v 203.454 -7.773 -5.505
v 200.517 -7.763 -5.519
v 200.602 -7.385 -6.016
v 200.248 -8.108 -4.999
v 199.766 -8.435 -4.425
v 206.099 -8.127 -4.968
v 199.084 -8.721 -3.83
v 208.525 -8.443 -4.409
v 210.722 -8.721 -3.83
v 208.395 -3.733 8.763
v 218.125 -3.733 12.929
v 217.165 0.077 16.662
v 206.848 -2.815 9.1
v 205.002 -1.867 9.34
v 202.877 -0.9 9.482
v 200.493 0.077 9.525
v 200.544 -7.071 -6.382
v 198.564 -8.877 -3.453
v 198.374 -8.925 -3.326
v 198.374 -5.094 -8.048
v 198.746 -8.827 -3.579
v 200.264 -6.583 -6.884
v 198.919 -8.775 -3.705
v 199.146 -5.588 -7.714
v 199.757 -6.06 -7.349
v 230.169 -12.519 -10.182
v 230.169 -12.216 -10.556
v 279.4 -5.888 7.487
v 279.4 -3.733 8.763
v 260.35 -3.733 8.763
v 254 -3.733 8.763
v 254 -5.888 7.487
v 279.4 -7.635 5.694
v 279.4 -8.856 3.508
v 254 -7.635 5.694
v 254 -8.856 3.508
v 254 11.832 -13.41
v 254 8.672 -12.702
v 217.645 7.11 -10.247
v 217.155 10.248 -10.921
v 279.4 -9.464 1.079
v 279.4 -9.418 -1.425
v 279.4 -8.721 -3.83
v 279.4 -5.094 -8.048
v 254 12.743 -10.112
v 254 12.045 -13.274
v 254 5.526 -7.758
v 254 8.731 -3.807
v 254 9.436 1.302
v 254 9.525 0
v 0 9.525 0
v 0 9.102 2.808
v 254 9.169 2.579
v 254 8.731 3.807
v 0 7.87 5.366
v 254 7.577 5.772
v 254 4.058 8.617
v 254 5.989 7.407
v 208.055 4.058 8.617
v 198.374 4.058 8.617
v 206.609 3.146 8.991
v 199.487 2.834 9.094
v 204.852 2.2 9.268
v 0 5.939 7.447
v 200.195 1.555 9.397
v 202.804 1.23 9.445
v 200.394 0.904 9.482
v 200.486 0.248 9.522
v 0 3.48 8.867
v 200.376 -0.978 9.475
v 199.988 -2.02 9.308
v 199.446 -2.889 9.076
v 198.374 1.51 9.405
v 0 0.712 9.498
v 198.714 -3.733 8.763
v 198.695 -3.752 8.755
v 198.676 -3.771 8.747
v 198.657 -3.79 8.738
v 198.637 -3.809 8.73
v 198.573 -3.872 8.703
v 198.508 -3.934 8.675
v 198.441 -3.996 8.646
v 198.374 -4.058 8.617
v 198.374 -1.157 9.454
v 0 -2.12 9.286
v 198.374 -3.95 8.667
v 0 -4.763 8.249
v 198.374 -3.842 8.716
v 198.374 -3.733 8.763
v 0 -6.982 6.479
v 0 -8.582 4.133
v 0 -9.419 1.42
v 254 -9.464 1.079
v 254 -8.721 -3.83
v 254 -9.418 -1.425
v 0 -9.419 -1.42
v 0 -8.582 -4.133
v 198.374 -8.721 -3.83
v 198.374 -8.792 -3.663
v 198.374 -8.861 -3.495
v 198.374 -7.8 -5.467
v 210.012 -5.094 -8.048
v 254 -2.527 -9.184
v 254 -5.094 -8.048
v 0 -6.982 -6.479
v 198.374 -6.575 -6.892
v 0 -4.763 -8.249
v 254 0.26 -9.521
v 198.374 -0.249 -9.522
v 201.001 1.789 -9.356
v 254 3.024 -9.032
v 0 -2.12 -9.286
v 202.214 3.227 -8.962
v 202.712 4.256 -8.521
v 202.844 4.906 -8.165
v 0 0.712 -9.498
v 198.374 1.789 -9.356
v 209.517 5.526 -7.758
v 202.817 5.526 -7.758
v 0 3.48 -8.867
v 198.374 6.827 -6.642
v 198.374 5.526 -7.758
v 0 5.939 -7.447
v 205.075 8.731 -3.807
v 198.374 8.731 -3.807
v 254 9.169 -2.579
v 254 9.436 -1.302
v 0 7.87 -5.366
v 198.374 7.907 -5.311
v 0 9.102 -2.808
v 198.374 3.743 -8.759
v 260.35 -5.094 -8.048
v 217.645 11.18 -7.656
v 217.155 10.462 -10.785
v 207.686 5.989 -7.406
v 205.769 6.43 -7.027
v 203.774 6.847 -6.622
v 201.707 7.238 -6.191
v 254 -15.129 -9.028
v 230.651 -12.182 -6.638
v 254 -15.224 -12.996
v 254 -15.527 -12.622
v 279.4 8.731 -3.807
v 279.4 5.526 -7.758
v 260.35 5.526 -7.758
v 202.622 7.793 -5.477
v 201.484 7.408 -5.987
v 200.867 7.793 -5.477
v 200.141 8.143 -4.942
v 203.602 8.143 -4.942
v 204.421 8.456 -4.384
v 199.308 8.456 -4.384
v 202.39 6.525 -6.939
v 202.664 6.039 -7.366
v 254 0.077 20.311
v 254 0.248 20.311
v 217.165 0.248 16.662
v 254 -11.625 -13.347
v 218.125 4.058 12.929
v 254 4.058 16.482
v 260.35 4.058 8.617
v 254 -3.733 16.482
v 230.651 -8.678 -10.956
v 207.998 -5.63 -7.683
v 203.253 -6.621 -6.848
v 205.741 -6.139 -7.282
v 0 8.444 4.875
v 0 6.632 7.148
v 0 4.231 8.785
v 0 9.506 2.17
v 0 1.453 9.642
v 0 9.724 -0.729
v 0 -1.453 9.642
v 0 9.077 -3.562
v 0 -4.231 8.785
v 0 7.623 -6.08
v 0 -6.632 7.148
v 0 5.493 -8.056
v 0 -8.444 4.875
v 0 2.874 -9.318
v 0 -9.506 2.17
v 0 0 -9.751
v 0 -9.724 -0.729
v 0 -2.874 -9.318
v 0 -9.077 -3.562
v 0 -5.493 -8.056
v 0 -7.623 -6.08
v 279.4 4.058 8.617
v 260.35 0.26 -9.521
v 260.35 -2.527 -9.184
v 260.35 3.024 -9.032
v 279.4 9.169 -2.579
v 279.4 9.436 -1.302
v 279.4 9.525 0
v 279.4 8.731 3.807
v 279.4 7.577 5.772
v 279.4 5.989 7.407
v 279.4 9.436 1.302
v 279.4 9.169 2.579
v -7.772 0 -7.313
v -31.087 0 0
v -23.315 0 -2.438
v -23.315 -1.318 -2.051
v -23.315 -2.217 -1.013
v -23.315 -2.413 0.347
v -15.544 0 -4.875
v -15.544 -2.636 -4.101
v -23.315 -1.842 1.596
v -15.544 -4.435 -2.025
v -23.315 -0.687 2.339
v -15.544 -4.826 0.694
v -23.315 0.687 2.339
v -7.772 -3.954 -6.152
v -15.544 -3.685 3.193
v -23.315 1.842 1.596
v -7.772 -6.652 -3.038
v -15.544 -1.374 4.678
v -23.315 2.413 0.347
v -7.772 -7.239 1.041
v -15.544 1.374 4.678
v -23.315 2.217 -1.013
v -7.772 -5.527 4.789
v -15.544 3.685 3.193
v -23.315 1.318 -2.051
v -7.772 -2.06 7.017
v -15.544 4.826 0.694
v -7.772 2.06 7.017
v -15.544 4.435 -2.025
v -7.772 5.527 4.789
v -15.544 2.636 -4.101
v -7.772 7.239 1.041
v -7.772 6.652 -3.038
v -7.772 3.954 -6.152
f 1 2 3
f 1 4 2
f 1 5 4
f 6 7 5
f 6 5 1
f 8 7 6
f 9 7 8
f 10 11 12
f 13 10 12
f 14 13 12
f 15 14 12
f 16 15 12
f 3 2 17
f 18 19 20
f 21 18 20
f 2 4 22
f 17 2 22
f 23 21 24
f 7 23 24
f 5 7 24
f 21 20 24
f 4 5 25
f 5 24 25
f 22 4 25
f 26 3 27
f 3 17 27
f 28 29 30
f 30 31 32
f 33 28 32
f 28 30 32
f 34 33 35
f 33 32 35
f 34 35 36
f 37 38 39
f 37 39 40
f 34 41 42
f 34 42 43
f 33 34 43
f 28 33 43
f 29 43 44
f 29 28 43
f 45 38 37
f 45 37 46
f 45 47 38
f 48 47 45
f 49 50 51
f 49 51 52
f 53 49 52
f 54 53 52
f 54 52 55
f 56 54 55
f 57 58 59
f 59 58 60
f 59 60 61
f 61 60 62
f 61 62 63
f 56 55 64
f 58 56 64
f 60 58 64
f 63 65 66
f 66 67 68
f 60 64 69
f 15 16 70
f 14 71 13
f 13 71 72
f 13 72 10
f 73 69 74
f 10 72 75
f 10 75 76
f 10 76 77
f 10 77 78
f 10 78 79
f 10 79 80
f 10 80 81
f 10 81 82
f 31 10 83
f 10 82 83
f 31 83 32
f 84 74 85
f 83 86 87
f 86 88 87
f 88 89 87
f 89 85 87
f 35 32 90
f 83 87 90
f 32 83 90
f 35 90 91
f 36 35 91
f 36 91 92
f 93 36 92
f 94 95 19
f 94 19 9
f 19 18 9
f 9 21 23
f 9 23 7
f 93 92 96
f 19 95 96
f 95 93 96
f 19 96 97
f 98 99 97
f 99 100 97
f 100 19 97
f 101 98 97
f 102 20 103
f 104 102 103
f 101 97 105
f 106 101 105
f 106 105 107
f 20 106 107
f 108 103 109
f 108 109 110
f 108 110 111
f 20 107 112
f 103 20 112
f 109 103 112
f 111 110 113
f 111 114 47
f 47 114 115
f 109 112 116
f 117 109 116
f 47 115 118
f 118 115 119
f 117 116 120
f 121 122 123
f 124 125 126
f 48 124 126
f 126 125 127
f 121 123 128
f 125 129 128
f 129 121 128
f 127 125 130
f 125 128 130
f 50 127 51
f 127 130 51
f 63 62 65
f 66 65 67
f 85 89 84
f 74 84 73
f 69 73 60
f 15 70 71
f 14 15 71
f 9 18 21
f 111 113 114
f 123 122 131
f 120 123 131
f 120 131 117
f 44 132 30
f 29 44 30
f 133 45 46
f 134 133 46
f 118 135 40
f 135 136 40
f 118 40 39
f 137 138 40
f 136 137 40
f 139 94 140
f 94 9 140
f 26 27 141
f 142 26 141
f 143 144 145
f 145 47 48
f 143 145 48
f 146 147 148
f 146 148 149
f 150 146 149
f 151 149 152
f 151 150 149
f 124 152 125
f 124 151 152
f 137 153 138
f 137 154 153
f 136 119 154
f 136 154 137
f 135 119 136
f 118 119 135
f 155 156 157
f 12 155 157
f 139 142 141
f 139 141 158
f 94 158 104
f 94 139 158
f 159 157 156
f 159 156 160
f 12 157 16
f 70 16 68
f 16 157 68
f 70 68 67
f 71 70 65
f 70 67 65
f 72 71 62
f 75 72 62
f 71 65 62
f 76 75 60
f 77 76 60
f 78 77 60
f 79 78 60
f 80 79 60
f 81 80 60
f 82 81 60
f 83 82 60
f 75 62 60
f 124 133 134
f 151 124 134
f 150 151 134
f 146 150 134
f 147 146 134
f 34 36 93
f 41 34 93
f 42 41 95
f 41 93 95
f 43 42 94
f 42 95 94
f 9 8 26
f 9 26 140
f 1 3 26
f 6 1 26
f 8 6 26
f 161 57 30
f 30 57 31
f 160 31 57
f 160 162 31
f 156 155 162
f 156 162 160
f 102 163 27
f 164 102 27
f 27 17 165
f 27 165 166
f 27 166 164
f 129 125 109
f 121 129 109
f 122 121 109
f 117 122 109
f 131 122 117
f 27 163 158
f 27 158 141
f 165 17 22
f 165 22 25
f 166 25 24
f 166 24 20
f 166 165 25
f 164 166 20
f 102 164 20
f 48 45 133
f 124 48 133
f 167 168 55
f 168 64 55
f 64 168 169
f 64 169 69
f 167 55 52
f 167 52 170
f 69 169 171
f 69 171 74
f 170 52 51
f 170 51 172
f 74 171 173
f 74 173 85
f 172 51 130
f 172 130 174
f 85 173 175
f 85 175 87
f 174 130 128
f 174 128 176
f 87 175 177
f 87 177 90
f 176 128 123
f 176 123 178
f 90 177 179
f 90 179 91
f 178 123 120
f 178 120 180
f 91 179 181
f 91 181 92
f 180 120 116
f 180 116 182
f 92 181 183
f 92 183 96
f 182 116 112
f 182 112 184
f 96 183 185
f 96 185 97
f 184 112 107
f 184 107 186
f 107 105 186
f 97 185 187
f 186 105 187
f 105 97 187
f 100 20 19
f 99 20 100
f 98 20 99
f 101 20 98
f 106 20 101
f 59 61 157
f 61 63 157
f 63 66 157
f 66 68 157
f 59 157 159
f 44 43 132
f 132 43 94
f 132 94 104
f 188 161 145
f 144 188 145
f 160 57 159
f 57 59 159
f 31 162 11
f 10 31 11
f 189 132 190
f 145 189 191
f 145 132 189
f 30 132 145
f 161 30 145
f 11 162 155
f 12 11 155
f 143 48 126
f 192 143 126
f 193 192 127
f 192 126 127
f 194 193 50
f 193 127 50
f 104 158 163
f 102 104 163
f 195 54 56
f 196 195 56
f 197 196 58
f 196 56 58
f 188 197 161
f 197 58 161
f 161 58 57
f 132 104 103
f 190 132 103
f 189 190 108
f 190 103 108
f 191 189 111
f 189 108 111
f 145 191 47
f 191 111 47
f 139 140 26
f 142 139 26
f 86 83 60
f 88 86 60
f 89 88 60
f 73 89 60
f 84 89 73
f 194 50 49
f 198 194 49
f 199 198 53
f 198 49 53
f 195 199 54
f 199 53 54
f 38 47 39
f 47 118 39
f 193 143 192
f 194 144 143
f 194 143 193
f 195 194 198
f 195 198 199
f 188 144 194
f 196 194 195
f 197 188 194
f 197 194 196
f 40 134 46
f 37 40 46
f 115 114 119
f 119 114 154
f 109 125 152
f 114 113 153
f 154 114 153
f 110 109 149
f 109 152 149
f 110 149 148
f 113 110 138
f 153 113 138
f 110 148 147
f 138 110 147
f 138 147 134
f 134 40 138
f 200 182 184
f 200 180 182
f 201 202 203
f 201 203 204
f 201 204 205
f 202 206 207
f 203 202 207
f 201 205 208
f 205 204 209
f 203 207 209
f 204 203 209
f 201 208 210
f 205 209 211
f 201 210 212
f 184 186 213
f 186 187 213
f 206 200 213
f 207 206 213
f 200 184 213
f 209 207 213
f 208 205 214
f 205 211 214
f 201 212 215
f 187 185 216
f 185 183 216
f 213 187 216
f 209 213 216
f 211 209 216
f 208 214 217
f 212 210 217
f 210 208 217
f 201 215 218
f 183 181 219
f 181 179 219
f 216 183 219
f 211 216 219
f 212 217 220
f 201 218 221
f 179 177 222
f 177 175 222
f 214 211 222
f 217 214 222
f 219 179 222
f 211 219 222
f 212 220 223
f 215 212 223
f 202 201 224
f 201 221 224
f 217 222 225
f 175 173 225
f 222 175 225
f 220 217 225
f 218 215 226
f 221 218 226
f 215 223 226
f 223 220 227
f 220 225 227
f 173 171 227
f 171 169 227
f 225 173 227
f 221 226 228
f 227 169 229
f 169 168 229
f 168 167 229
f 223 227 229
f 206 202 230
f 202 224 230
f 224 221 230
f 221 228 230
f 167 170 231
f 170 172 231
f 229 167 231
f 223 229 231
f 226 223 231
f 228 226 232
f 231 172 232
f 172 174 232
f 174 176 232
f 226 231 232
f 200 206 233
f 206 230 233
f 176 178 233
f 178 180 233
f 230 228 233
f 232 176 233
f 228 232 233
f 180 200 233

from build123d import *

# Parameters (mm, degrees)
F0_R          = 9.525
F1_DEPTH      = 254
F5_DEPTH      = 55.626
F7_DEPTH      = 6.35
F8_DEPTH      = 25.4
F10_DEPTH     = 25.4
F12_DEPTH     = 25.4
F14_DEPTH     = 25.4
F15_T1_DEPTH  = 44.8533405939
F15_T3_DEPTH  = 44.8533405939
F15_T8_DEPTH  = 28.2795963183
F15_S9_R      = 9.525
F15_T10_DEPTH = 17
F15_T14_DEPTH = 27.9095113127
F15_S15_R     = 9.525
F15_T16_DEPTH = 17
F16_T1_DEPTH  = 52.8359208118
F16_T3_DEPTH  = 52.8359208118
F16_T8_DEPTH  = 31.126263523
F16_S9_R      = 9.525
F16_T10_DEPTH = 18
F16_T14_DEPTH = 35.8525293061
F16_S15_R     = 9.525
F16_T16_DEPTH = 20
F17_T1_DEPTH  = 37.2074314298
F17_T3_DEPTH  = 37.2074314298
F17_T8_DEPTH  = 45.6448991689
F17_S9_R      = 9.525
F17_T10_DEPTH = 25
F17_T14_DEPTH = 44.9174010309
F17_S15_R     = 9.525
F17_T16_DEPTH = 25


# Not quite as in the source:
# - a fillet or chamfer that OpenCascade refuses, or shapes differently, is made with other operations: its cross-section is extruded or revolved along the edge and cut away or added
# - a feature names something its author has since deleted; it is built from what else it names


with BuildPart() as f1:
    # F0 (on Right) → F1 (new body)
    with BuildSketch(Plane.YZ):
        Circle(F0_R)
    extrude(amount=F1_DEPTH)

    # F2 (on Front) → F3 (revolve)
    with BuildSketch(Plane.XZ):
        Polygon((0, -9.7508067265), (0, 0), (-31.0870110989, 0), align=None)
    revolve(axis=Axis((-15.5435055494, 0, 0), (-1, 0, 0)))

    # F4 (on face) → F5 (join)
    with BuildSketch(Plane.YZ.offset(254)):
        with BuildLine():
            ThreePointArc((-3.7328505423, 8.7630731955), (0.1780475173, 9.5233357644), (4.0577948396, 8.6174199178))
            Line((4.0577948396, 8.6174199178), (4.0577948396, 20.311106017))
            Line((4.0577948396, 20.311106017), (-3.7328505423, 20.311106017))
            Line((-3.7328505423, 20.311106017), (-3.7328505423, 8.7630731955))
        make_face()
        with BuildLine():
            ThreePointArc((-5.0939482873, -8.0484356149), (-7.2224802699, -6.2097829069), (-8.7212105654, -3.8296359191))
            Line((-8.7212105654, -3.8296359191), (-17.1272028238, -10.6496075168))
            Line((-17.1272028238, -10.6496075168), (-13.6232364185, -14.9684399422))
            Line((-13.6232364185, -14.9684399422), (-5.0939482873, -8.0484356149))
        make_face()
        with BuildLine():
            Line((13.9740978255, -12.0467544007), (8.7309135752, -3.8074628223))
            ThreePointArc((8.7309135752, -3.8074628223), (7.3970545146, -6.0007674099), (5.5259177996, -7.75821226))
            Line((5.5259177996, -7.75821226), (9.9034377135, -14.6371738298))
            Line((9.9034377135, -14.6371738298), (13.9740978255, -12.0467544007))
        make_face()
    extrude(amount=-F5_DEPTH)

    # F6 (on face) → F7 (join)
    with BuildSketch(Plane.YZ.offset(254)):
        Polygon((4.0577948396, 8.6174199178), (-3.7328505423, 8.7630731955), (-5.0939482873, -8.0484356149), (5.5259177996, -7.75821226), align=None)
        with BuildLine():
            Line((5.5259177996, -7.75821226), (-5.0939482873, -8.0484356149))
            ThreePointArc((-5.0939482873, -8.0484356149), (0.2602053301, -9.5214451732), (5.5259177996, -7.75821226))
        make_face()
    extrude(amount=F7_DEPTH)

    # F6 (on face) → F8 (join)
    with BuildSketch(Plane.YZ.offset(254)):
        Polygon((-5.0939482873, -8.0484356149), (-3.7328505423, 8.7630731955), (-8.8555062097, 3.5079388207), (-8.7212105654, -3.8296359191), align=None)
        Polygon((8.7309135752, 3.8074628223), (4.0577948396, 8.6174199178), (5.5259177996, -7.75821226), (8.7309135752, -3.8074628223), align=None)
        with BuildLine():
            ThreePointArc((9.525, 0), (9.3243653083, 1.9446944743), (8.7309135752, 3.8074628223))
            Line((8.7309135752, 3.8074628223), (8.7309135752, -3.8074628223))
            ThreePointArc((8.7309135752, -3.8074628223), (9.3243653083, -1.9446944743), (9.525, 0))
        make_face()
        with BuildLine():
            ThreePointArc((8.7309135752, 3.8074628223), (6.8316679914, 6.6373140242), (4.0577948396, 8.6174199178))
            Line((4.0577948396, 8.6174199178), (8.7309135752, 3.8074628223))
        make_face()
        with BuildLine():
            Line((-8.7212105654, -3.8296359191), (-8.8555062097, 3.5079388207))
            ThreePointArc((-8.8555062097, 3.5079388207), (-9.5234050588, -0.1743017091), (-8.7212105654, -3.8296359191))
        make_face()
        with BuildLine():
            Line((-8.8555062097, 3.5079388207), (-3.7328505423, 8.7630731955))
            ThreePointArc((-3.7328505423, 8.7630731955), (-6.8206151301, 6.6486716152), (-8.8555062097, 3.5079388207))
        make_face()
    extrude(amount=F8_DEPTH)

    # F9 (on face) → F10 (cut)
    with BuildSketch(Plane(origin=(0, 4.0577948396, 0), x_dir=(-1, 0, 0), z_dir=(0, 1, 0))):
        Polygon((-217.1654254198, 16.6623666883), (-198.374, 8.6174199178), (-198.374, 20.311106017), (-254, 20.311106017), align=None)
    extrude(amount=-F10_DEPTH, mode=Mode.SUBTRACT)

    # F11 (on face) → F12 (cut)
    with BuildSketch(Plane(origin=(0, 4.4898005119, 2.8571450721), x_dir=(-1, 0, 0), z_dir=(0, 0.843661548, 0.5368753975))):
        Polygon((-198.374, -7.8996226746), (-217.1549183124, -14.7158552648), (-254, -17.6657327906), (-198.374, -17.6657327906), align=None)
    extrude(amount=-F12_DEPTH, mode=Mode.SUBTRACT)

    # F13 (on face) → F14 (cut)
    with BuildSketch(Plane(origin=(0, 1.9157700793, -2.3612925984), x_dir=(1, 0, 0), z_dir=(0, 0.6300417268, -0.7765612806))):
        Polygon((230.1693707705, 16.137143597), (254, 20.0100196673), (198.374, 20.0100196673), (198.374, 9.0266132778), align=None)
    extrude(amount=-F14_DEPTH, mode=Mode.SUBTRACT)

    # F15: chamfer of 3.81 on 4 edges, made by hand

    # F15_s2 → F15_t1 (cut)
    with BuildSketch(Plane(origin=(257.4244465349, 0, 25.499811331), x_dir=(0, 1, 0), z_dir=(-0.9951296233, 0, -0.098575011))):
        with BuildLine():
            Line((0.1400317661, 4.7181064364), (4.165557913, 8.7436325833))
            Line((4.165557913, 8.7436325833), (4.241757913, 8.7436325833))
            ThreePointArc((4.241757913, 8.7436325833), (4.1339948396, 6.7847510466), (4.1339948396, 4.8258695099))
            Line((4.1339948396, 4.8258695099), (4.0577948396, 4.7496695099))
            ThreePointArc((4.0577948396, 4.7496695099), (2.0989133028, 4.7496695099), (0.1400317661, 4.6419064364))
            Line((0.1400317661, 4.6419064364), (0.1400317661, 4.7181064364))
        make_face()
    extrude(amount=F15_T1_DEPTH, mode=Mode.SUBTRACT)

    # F15_s4 → F15_t3 (cut)
    with BuildSketch(Plane(origin=(212.789558605, 0, 21.0783927893), x_dir=(0, 1, 0), z_dir=(0.9951296233, 0, 0.098575011))):
        with BuildLine():
            Line((-3.8406136157, -8.7436325833), (0.1849125312, -4.7181064364))
            Line((0.1849125312, -4.7181064364), (0.1849125312, -4.6419064364))
            ThreePointArc((0.1849125312, -4.6419064364), (-1.7739690056, -4.7496695099), (-3.7328505423, -4.7496695099))
            Line((-3.7328505423, -4.7496695099), (-3.8090505423, -4.8258695099))
            ThreePointArc((-3.8090505423, -4.8258695099), (-3.8090505423, -6.7847510466), (-3.9168136157, -8.7436325833))
            Line((-3.9168136157, -8.7436325833), (-3.8406136157, -8.7436325833))
        make_face()
    extrude(amount=F15_T3_DEPTH, mode=Mode.SUBTRACT)


with BuildPart() as f15_tool6:
    # F15_s7 → F15_t8 (new body)
    with BuildSketch(Plane(origin=(193.1590423404, 0, 82.6948557196), x_dir=(0, 1, 0), z_dir=(-0.9192958979, 0, -0.3935670871))):
        with BuildLine():
            Line((0.1400317661, 70.0437554835), (4.165557913, 74.0692816304))
            Line((4.165557913, 74.0692816304), (4.241757913, 74.0692816304))
            ThreePointArc((4.241757913, 74.0692816304), (4.1339948396, 72.1104000937), (4.1339948396, 70.1515185569))
            Line((4.1339948396, 70.1515185569), (4.0577948396, 70.0753185569))
            ThreePointArc((4.0577948396, 70.0753185569), (2.0989133028, 70.0753185569), (0.1400317661, 69.9675554835))
            Line((0.1400317661, 69.9675554835), (0.1400317661, 70.0437554835))
        make_face()
    extrude(amount=F15_T8_DEPTH)

    # F15_s9 → F15_t10 (cut, symmetric)
    with BuildSketch(Plane.YZ.offset(208.5)):
        Circle(F15_S9_R)
    extrude(amount=F15_T10_DEPTH, both=True, mode=Mode.SUBTRACT)


with BuildPart() as f1_1:
    add(f1.part)

    # F15_t5: cut F15_tool6
    add(f15_tool6.part, mode=Mode.SUBTRACT)


with BuildPart() as f15_tool12:
    # F15_s13 → F15_t14 (new body)
    with BuildSketch(Plane(origin=(167.5019430775, 0, 71.7105906496), x_dir=(0, 1, 0), z_dir=(0.9192958979, 0, 0.3935670871))):
        with BuildLine():
            Line((-3.8406136157, -74.0692816304), (0.1849125312, -70.0437554835))
            Line((0.1849125312, -70.0437554835), (0.1849125312, -69.9675554835))
            ThreePointArc((0.1849125312, -69.9675554835), (-1.7739690056, -70.0753185569), (-3.7328505423, -70.0753185569))
            Line((-3.7328505423, -70.0753185569), (-3.8090505423, -70.1515185569))
            ThreePointArc((-3.8090505423, -70.1515185569), (-3.8090505423, -72.1104000937), (-3.9168136157, -74.0692816304))
            Line((-3.9168136157, -74.0692816304), (-3.8406136157, -74.0692816304))
        make_face()
    extrude(amount=F15_T14_DEPTH)

    # F15_s15 → F15_t16 (cut, symmetric)
    with BuildSketch(Plane.YZ.offset(208.7)):
        Circle(F15_S15_R)
    extrude(amount=F15_T16_DEPTH, both=True, mode=Mode.SUBTRACT)


with BuildPart() as f1_2:
    add(f1_1.part)

    # F15_t11: cut F15_tool12
    add(f15_tool12.part, mode=Mode.SUBTRACT)

    # F16: chamfer of 2.286 on 4 edges, made by hand

    # F16_s2 → F16_t1 (cut)
    with BuildSketch(Plane(origin=(259.6477190804, 11.1604697827, -17.5378854343), x_dir=(0.042943471, -0.9990775037, 0), z_dir=(-0.9968103928, -0.0428460235, 0.0673294822))):
        Polygon((2.2434282818, 4.4374187115), (-0.9134913616, 3.7406760293), (1.0133398012, 2.5105875487), align=None)
    extrude(amount=F16_T1_DEPTH, mode=Mode.SUBTRACT)

    # F16_s4 → F16_t3 (cut)
    with BuildSketch(Plane(origin=(206.9803241045, 8.8966606792, -13.980470247), x_dir=(-0.042943471, 0.9990775037, 0), z_dir=(0.9968103928, 0.0428460235, -0.0673294822))):
        Polygon((1.823476661, 7.0337297004), (1.1267339788, 3.8768100571), (3.0535651416, 5.1068985377), align=None)
    extrude(amount=F16_T3_DEPTH, mode=Mode.SUBTRACT)


with BuildPart() as f16_tool6:
    # F16_s7 → F16_t8 (new body)
    with BuildSketch(Plane(origin=(205.9939924457, 40.1379913763, -63.0740020828), x_dir=(0.1912534961, -0.9815406768, 0), z_dir=(-0.9400053053, -0.1831603164, 0.2878234257))):
        Polygon((31.47248323, 51.4536328512), (34.6470195867, 52.0651154105), (33.365492688, 50.1721059525), align=None)
    extrude(amount=F16_T8_DEPTH)

    # F16_s9 → F16_t10 (cut, symmetric)
    with BuildSketch(Plane.YZ.offset(212.3)):
        Circle(F16_S9_R)
    extrude(amount=F16_T10_DEPTH, both=True, mode=Mode.SUBTRACT)


with BuildPart() as f1_3:
    add(f1_2.part)

    # F16_t5: cut F16_tool6
    add(f16_tool6.part, mode=Mode.SUBTRACT)


with BuildPart() as f16_tool12:
    # F16_s13 → F16_t14 (new body)
    with BuildSketch(Plane(origin=(172.2924246879, 33.5712307637, -52.7548042766), x_dir=(-0.1912534961, 0.9815406768, 0), z_dir=(0.9400053053, 0.1831603164, -0.2878234257))):
        Polygon((-30.6515011053, 54.7699959311), (-31.2629836646, 51.5954595744), (-29.3699742066, 52.8769864731), align=None)
    extrude(amount=F16_T14_DEPTH)

    # F16_s15 → F16_t16 (cut, symmetric)
    with BuildSketch(Plane.YZ.offset(210.1)):
        Circle(F16_S15_R)
    extrude(amount=F16_T16_DEPTH, both=True, mode=Mode.SUBTRACT)


with BuildPart() as f1_4:
    add(f1_3.part)

    # F16_t11: cut F16_tool12
    add(f16_tool12.part, mode=Mode.SUBTRACT)

    # F17: chamfer of 2.54 on 4 edges, made by hand

    # F17_s2 → F17_t1 (cut)
    with BuildSketch(Plane(origin=(220.3542251508, -27.8096296574, -22.5625813797), x_dir=(0.1252109944, 0.9921301361, 0), z_dir=(0.9870501192, -0.1245698749, -0.1010663563))):
        Polygon((20.2701864549, 12.3371401962), (16.6998573856, 12.7320456743), (18.2875691812, 10.7494284006), align=None)
    extrude(amount=F17_T1_DEPTH, mode=Mode.SUBTRACT)

    # F17_s4 → F17_t3 (cut)
    with BuildSketch(Plane(origin=(257.0798247798, -32.4445547373, -26.3230009032), x_dir=(-0.1252109944, -0.9921301361, 0), z_dir=(-0.9870501192, 0.1245698749, 0.1010663563))):
        Polygon((-16.7937957885, 16.6782002076), (-16.3988903104, 13.1078711382), (-14.8111785147, 15.090488412), align=None)
    extrude(amount=F17_T3_DEPTH, mode=Mode.SUBTRACT)


with BuildPart() as f17_tool6:
    # F17_s7 → F17_t8 (new body)
    with BuildSketch(Plane(origin=(184.4733137003, -32.036670961, -25.9920755723), x_dir=(0.1711045444, 0.9852528787, 0), z_dir=(0.9758943907, -0.1694792968, -0.1375023858))):
        Polygon((30.9152465813, 20.5992083681), (27.3471595892, 21.0138832013), (28.9238656686, 19.0225022887), align=None)
    extrude(amount=F17_T8_DEPTH)

    # F17_s9 → F17_t10 (cut, symmetric)
    with BuildSketch(Plane.YZ.offset(214.5)):
        Circle(F17_S9_R)
    extrude(amount=F17_T10_DEPTH, both=True, mode=Mode.SUBTRACT)


with BuildPart() as f1_5:
    add(f1_4.part)

    # F17_t5: cut F17_tool6
    add(f17_tool6.part, mode=Mode.SUBTRACT)


with BuildPart() as f17_tool12:
    # F17_s13 → F17_t14 (new body)
    with BuildSketch(Plane(origin=(229.0179147643, -39.7725363756, -32.2683581086), x_dir=(-0.1711045444, -0.9852528787, 0), z_dir=(-0.9758943907, 0.1694792968, 0.1375023858))):
        Polygon((-27.0482787605, 21.3913699029), (-27.4629535937, 24.959456895), (-25.4715726811, 23.3827508156), align=None)
    extrude(amount=F17_T14_DEPTH)

    # F17_s15 → F17_t16 (cut, symmetric)
    with BuildSketch(Plane.YZ.offset(214.9)):
        Circle(F17_S15_R)
    extrude(amount=F17_T16_DEPTH, both=True, mode=Mode.SUBTRACT)


with BuildPart() as f1_6:
    add(f1_5.part)

    # F17_t11: cut F17_tool12
    add(f17_tool12.part, mode=Mode.SUBTRACT)


solid = f1_6.part
